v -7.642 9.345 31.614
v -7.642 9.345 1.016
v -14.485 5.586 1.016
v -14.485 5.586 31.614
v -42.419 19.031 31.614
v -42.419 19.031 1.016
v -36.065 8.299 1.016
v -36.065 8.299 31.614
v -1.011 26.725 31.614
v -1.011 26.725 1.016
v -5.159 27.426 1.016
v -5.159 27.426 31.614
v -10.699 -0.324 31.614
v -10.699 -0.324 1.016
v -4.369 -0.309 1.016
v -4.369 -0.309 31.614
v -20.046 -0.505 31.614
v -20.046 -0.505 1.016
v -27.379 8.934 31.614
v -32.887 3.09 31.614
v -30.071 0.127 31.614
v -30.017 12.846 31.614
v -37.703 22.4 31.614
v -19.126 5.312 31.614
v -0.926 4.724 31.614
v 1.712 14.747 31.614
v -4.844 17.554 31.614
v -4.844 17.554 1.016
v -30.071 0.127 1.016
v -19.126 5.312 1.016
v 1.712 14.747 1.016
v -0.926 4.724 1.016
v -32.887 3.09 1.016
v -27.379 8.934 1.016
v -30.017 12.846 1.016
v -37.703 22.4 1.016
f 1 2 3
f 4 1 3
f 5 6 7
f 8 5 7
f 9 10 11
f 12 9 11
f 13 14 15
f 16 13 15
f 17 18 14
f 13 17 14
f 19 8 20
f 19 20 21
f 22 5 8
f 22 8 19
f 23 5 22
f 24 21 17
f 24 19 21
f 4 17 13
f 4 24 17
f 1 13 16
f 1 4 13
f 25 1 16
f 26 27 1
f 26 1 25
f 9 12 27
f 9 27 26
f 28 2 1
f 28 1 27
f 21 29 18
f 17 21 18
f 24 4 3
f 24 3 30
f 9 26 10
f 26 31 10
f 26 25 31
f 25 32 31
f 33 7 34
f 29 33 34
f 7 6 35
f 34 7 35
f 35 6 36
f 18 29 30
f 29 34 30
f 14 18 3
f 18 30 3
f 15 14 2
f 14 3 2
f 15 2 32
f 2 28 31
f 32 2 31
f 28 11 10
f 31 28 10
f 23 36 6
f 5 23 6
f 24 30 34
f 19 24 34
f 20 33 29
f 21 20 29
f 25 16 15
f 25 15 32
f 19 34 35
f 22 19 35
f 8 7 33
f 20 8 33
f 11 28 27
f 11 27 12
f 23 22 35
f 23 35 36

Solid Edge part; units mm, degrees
sketch "Sketch1" plane through (0, 0, 1.016) normal (0, 0, 1) x (1, 0, 0)
  line L0 (-0.9256, 4.7235) -> (1.7124, 14.7466)
  line L1 (1.7124, 14.7466) -> (-1.0114, 26.7246)
  line L2 (-1.0114, 26.7246) -> (-5.1593, 27.4261)
  line L3 (-4.8437, 17.5537) -> (-5.1593, 27.4261)
  line L4 (-7.642, 9.3453) -> (-4.8437, 17.5537)
  line L5 (-7.642, 9.3453) -> (-14.4851, 5.5865)
  line L6 (-14.4851, 5.5865) -> (-19.1259, 5.3116)
  line L7 (-19.1259, 5.3116) -> (-27.3787, 8.9338)
  line L8 (-27.3787, 8.9338) -> (-30.0174, 12.8462)
  line L9 (-30.0174, 12.8462) -> (-37.7029, 22.3995)
  line L10 (-37.7029, 22.3995) -> (-42.4186, 19.0311)
  line L11 (-42.4186, 19.0311) -> (-36.0653, 8.2993)
  line L12 (-36.0653, 8.2993) -> (-32.8868, 3.0901)
  line L13 (-32.8868, 3.0901) -> (-30.071, 0.1266)
  line L14 (-30.071, 0.1266) -> (-20.0462, -0.5049)
  line L15 (-20.0462, -0.5049) -> (-10.6994, -0.3245)
  line L16 (-10.6994, -0.3245) -> (-4.3689, -0.3091)
  line L17 (-4.3689, -0.3091) -> (-0.9256, 4.7235)
extrude "Protrusion1" add sketch "Sketch1" along normal up to vertex (30.5976 mm away)
